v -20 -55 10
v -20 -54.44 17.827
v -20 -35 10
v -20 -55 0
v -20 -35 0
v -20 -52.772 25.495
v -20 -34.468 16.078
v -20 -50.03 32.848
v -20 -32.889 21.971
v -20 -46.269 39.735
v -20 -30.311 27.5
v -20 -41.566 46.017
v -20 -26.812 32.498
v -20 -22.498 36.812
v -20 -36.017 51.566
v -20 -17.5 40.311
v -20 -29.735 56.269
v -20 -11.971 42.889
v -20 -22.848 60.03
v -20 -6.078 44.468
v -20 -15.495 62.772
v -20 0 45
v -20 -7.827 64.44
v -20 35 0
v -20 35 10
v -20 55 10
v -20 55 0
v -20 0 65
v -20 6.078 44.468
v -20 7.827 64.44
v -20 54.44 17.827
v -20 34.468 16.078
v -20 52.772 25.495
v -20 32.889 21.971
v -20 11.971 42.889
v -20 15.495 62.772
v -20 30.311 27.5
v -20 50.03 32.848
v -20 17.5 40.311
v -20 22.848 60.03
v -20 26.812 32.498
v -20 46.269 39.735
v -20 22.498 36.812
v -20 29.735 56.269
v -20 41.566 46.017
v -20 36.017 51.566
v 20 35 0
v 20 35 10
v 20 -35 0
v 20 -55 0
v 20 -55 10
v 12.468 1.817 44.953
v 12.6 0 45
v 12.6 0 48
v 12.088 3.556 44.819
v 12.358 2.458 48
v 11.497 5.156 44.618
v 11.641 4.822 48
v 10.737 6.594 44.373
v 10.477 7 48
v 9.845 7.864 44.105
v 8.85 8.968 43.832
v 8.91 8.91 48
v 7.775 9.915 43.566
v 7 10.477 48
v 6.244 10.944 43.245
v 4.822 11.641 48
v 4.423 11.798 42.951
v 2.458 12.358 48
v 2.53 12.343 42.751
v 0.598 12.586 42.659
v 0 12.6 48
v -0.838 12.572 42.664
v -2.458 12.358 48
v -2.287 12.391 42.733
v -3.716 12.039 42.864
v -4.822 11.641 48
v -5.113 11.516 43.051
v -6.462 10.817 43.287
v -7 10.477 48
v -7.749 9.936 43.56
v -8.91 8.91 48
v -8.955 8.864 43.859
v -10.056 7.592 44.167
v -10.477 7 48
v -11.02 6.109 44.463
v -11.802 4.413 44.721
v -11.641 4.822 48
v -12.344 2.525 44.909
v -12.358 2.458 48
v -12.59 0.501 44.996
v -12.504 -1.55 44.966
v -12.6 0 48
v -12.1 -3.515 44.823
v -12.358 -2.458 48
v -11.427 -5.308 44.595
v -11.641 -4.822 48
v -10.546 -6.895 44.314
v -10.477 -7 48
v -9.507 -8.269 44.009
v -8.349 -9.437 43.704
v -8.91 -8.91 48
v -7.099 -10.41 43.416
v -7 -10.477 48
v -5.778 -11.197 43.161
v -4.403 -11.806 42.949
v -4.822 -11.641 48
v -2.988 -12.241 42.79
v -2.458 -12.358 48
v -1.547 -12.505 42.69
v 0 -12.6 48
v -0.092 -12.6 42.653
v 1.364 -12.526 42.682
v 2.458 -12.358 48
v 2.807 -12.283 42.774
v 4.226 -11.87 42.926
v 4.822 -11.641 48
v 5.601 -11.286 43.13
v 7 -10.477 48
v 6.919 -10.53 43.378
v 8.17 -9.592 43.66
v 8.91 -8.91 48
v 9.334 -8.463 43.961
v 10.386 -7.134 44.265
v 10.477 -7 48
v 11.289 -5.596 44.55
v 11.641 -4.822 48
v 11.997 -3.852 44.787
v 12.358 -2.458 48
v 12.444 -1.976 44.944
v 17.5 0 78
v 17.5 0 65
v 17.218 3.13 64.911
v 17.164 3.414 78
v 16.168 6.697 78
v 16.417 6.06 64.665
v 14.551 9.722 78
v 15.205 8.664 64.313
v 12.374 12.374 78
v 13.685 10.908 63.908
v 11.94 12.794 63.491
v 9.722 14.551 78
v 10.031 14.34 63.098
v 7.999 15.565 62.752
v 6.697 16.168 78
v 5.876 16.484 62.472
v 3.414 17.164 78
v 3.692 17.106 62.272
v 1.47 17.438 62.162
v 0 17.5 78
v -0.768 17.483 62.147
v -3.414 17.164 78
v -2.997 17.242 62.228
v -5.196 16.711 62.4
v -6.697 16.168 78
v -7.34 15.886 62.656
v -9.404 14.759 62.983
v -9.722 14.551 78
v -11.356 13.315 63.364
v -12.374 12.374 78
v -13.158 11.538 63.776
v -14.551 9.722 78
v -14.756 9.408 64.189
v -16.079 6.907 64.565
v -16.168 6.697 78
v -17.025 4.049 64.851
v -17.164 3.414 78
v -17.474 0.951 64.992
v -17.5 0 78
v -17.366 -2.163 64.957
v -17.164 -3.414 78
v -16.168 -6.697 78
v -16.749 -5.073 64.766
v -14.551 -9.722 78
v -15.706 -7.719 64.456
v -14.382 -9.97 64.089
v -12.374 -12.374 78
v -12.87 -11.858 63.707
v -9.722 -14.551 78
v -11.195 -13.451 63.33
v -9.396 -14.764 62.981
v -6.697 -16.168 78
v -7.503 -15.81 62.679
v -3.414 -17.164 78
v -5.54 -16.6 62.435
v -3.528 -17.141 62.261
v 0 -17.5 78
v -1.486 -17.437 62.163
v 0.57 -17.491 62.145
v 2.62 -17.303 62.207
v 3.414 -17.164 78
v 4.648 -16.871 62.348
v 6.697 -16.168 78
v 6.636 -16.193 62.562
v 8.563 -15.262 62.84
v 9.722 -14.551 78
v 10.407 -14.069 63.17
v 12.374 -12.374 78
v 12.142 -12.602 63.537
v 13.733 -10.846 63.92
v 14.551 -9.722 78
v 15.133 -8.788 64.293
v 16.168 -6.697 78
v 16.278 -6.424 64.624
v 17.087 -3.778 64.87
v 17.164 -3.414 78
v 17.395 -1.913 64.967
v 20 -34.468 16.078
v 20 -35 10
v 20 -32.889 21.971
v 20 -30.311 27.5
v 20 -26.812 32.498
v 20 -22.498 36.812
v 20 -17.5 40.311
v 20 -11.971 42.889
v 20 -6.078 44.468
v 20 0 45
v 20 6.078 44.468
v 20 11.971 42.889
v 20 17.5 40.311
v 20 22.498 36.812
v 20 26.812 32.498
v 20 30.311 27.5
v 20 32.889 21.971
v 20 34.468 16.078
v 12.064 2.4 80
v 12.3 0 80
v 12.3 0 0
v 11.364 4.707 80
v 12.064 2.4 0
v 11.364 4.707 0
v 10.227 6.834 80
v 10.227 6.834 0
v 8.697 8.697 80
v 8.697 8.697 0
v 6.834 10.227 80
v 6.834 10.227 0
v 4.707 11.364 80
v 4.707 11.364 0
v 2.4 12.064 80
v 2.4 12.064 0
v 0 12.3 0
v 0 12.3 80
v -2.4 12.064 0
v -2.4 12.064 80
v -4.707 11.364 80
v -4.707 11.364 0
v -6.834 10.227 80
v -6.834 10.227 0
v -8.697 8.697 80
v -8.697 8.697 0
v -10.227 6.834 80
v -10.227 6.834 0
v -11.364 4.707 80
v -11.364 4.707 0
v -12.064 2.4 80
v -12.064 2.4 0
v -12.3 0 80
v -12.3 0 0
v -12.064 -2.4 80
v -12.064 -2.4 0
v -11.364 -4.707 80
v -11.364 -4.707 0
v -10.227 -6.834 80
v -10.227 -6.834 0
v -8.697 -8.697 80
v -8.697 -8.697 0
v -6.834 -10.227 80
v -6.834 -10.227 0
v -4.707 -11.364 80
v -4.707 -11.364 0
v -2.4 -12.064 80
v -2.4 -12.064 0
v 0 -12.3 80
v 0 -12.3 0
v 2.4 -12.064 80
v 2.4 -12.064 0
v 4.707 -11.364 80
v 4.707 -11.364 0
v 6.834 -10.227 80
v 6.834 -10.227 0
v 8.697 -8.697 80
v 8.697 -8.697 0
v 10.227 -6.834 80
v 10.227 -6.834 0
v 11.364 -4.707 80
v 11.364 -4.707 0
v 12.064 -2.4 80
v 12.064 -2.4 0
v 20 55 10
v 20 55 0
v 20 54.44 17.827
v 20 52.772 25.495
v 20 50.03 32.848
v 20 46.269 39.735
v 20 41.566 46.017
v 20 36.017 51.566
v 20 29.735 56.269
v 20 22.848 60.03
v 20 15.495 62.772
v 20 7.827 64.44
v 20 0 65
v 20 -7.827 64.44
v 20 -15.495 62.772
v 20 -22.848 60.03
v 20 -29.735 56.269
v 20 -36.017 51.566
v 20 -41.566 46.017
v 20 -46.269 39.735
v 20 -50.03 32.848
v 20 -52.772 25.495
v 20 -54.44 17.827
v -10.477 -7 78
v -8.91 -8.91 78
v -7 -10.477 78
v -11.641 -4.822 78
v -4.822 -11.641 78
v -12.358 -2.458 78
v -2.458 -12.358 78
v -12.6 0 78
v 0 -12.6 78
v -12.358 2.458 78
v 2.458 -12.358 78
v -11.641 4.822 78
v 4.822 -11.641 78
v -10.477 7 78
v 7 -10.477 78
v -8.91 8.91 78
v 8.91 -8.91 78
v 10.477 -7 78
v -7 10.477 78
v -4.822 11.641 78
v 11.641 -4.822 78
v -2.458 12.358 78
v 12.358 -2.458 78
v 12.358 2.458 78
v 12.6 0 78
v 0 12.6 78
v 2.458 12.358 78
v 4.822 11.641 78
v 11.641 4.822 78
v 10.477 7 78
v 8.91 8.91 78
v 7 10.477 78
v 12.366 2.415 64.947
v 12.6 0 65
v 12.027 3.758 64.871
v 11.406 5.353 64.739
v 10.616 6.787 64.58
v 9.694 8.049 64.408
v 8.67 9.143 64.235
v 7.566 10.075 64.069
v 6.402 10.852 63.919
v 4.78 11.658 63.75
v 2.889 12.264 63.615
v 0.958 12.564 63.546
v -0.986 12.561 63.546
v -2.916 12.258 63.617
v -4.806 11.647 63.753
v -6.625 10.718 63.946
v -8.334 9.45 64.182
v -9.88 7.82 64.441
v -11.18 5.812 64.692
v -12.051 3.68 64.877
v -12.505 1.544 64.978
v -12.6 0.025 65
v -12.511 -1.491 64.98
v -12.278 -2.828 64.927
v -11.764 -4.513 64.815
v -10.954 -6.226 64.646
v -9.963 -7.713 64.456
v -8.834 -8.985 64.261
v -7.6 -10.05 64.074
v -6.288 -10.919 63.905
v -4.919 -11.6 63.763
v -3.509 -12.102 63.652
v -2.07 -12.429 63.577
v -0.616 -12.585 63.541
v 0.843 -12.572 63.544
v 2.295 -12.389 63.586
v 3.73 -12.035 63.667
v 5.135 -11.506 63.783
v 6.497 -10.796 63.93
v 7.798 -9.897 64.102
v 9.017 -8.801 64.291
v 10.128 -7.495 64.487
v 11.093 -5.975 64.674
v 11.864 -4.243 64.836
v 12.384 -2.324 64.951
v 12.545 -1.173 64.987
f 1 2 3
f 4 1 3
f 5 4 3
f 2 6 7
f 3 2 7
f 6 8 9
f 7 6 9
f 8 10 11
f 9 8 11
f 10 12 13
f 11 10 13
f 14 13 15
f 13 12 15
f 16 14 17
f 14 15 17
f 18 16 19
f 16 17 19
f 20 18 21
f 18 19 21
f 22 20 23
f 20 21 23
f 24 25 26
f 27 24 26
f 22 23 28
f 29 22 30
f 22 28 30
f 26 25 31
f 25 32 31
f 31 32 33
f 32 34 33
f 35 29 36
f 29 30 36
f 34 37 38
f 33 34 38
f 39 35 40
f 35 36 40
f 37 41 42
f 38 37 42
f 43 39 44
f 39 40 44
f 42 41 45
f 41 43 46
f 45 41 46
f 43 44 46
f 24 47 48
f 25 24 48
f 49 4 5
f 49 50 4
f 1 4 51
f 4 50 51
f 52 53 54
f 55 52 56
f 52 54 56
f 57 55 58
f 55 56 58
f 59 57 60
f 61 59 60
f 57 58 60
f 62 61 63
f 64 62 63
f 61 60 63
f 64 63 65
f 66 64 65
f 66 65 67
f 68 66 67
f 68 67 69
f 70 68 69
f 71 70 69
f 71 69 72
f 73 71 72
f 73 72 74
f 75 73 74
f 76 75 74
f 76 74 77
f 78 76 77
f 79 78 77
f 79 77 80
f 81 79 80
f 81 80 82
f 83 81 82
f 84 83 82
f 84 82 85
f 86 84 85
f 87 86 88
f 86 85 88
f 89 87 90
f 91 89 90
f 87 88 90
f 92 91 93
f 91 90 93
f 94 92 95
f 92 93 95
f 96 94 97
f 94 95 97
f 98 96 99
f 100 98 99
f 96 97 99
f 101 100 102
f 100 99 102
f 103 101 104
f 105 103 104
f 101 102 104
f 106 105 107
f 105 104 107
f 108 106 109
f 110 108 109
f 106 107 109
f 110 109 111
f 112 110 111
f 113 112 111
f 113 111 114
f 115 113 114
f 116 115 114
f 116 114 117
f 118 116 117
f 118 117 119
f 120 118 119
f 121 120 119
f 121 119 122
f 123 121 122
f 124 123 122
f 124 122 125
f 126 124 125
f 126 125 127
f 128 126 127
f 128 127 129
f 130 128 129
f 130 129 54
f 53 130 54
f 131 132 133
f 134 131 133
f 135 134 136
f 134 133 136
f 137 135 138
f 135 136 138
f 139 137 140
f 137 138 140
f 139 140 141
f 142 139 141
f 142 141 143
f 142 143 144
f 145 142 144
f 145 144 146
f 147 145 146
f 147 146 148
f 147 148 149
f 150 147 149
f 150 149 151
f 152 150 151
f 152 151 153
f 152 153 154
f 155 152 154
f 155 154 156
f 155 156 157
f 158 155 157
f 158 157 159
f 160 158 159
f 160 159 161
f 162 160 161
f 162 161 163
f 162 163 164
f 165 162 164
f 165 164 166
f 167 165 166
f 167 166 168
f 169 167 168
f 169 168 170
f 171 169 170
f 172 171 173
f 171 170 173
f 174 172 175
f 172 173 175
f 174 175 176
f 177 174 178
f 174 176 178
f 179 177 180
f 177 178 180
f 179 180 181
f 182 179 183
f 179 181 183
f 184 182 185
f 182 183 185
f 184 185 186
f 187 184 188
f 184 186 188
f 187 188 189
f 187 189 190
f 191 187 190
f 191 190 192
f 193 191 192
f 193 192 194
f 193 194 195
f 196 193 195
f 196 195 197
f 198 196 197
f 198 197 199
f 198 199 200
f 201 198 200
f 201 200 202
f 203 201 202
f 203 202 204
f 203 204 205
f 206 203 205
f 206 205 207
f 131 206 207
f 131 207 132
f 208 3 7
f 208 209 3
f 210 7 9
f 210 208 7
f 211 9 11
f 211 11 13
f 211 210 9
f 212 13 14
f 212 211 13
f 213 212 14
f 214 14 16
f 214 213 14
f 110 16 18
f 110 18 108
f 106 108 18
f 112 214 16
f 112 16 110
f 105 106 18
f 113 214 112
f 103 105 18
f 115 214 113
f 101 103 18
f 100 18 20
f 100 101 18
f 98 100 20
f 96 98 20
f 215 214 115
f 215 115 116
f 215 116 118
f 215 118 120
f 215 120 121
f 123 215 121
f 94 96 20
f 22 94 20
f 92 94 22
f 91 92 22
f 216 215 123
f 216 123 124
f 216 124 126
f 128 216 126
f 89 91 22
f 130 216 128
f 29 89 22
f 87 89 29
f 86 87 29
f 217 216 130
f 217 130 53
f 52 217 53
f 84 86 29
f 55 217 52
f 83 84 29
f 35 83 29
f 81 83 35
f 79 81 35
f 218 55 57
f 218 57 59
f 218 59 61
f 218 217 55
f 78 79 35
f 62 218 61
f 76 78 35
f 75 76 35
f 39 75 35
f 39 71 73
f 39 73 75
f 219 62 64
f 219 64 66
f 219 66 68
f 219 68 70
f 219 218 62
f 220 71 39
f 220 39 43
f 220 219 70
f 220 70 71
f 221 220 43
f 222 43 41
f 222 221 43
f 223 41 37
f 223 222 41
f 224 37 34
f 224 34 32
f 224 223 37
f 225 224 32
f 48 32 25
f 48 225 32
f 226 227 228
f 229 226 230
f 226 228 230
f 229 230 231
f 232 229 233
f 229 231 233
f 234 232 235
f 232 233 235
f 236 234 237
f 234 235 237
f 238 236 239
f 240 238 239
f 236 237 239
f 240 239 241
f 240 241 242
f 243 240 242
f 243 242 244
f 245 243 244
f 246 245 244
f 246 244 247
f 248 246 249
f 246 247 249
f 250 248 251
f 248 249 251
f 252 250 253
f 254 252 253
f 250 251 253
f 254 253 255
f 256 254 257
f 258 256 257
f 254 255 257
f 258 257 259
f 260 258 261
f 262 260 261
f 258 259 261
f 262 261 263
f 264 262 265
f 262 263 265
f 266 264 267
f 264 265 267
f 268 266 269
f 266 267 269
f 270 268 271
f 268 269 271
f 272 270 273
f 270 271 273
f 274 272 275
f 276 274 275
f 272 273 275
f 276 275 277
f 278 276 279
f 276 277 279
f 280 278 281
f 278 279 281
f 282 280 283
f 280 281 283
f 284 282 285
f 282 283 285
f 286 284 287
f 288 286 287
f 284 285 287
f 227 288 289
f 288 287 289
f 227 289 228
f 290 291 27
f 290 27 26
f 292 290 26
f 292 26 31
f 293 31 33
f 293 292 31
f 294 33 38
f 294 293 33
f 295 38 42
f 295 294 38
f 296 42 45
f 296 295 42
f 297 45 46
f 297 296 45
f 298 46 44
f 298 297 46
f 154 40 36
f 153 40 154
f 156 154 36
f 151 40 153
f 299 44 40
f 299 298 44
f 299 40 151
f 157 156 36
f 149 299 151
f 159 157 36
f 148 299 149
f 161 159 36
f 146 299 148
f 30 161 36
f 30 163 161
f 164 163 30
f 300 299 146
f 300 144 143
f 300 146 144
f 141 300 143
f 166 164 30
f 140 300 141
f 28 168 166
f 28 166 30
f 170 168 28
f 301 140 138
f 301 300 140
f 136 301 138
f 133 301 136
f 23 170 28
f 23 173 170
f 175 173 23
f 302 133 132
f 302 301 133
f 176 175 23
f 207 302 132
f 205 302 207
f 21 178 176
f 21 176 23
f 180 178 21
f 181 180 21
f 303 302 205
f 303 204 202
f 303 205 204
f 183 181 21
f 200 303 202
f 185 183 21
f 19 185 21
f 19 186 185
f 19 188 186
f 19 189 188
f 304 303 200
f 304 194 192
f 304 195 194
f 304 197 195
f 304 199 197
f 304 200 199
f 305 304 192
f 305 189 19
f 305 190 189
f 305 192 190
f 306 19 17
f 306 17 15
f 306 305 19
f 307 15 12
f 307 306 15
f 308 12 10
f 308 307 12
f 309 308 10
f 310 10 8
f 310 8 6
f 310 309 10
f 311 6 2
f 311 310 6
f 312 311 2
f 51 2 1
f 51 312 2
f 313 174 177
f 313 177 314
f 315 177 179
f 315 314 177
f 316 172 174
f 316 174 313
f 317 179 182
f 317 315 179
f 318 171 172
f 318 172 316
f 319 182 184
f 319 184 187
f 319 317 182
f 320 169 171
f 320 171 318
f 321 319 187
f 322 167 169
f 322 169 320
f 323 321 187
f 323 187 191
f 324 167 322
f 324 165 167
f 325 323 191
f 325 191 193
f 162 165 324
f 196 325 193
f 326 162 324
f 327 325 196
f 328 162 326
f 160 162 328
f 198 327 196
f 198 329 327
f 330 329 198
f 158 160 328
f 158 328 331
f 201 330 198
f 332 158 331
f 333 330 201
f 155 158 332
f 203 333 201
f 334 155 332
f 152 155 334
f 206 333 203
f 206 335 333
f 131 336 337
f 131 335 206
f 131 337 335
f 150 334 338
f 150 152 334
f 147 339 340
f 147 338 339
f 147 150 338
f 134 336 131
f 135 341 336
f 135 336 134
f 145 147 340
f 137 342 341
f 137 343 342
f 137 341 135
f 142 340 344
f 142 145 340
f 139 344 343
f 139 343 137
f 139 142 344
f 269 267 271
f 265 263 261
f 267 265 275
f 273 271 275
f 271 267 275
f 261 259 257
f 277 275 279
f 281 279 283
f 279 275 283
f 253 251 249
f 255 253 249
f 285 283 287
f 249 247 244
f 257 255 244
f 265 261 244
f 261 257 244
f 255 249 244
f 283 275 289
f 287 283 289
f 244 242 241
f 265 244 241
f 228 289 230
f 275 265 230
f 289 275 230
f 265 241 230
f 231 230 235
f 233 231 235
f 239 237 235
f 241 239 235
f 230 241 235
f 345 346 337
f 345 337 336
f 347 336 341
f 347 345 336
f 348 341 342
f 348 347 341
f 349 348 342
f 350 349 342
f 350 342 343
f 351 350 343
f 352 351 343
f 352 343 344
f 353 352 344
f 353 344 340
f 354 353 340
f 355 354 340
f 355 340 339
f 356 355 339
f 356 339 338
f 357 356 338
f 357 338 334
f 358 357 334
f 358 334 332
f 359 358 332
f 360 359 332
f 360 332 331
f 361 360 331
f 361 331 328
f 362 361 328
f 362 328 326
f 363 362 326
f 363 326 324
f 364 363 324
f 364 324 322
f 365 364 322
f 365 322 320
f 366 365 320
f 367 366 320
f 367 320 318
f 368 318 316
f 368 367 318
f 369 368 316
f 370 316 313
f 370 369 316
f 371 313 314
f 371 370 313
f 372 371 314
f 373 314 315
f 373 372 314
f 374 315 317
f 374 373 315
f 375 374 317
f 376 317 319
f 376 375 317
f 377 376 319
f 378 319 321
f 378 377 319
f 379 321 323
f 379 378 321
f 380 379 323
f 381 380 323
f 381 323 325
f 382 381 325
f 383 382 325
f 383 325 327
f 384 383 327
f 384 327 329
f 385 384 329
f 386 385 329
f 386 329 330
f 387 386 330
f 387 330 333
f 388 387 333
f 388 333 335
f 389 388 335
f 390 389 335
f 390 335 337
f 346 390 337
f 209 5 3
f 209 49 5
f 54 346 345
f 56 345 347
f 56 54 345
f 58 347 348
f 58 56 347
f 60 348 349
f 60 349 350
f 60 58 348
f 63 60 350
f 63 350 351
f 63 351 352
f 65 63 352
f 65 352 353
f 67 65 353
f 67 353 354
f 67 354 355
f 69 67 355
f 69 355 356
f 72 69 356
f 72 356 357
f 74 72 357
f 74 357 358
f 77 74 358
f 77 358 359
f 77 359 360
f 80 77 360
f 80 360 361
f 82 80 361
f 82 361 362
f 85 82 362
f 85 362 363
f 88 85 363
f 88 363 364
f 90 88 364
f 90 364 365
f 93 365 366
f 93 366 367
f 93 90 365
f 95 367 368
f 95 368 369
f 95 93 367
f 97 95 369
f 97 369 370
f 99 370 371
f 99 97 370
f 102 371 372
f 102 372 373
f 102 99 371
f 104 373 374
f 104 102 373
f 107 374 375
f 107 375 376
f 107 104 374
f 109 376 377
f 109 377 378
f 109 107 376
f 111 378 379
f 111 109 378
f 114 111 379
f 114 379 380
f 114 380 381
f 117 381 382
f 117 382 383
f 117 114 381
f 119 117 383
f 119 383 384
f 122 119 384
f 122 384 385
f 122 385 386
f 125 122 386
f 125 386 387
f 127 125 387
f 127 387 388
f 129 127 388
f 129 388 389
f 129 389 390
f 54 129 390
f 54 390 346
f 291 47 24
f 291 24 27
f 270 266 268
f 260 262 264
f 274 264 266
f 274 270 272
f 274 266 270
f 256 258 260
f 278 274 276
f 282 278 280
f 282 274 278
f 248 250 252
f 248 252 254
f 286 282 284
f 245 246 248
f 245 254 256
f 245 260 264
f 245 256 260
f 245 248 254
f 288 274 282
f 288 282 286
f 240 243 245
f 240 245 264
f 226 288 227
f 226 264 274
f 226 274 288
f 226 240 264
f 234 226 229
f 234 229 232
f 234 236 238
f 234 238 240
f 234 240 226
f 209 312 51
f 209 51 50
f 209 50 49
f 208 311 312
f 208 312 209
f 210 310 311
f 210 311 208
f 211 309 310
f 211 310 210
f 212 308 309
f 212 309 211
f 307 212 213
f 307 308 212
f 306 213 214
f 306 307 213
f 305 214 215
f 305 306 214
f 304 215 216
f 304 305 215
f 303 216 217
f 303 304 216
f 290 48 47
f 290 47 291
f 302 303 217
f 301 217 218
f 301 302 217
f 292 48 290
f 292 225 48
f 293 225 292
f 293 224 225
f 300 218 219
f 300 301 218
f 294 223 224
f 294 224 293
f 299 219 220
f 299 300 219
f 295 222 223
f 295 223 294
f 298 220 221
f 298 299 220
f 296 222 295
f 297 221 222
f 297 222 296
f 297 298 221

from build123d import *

# Parameters (mm, degrees)
F0_W          = 20
F0_H          = 10
F1_DEPTH      = 20
F1_DEPTH_BACK = 20
F3_R          = 17.5
F3_R_2        = 12.6
F4_DEPTH      = 30
F5_DEPTH      = 30
F5_DEPTH_BACK = 40
F6_R          = 12.3
F7_DEPTH      = 80


with BuildPart() as f1:
    # F0 (on Right) → F1 (new body, two sides)
    with BuildSketch(Plane.YZ) as f1_sk:
        with BuildLine():
            ThreePointArc((-35, 10), (0, 45), (35, 10))
            Line((35, 10), (55, 10))
            ThreePointArc((55, 10), (0, 65), (-55, 10))
            Line((-55, 10), (-35, 10))
        make_face()
        with Locations((-45, 5)):
            Rectangle(F0_W, F0_H)
        with Locations((45, 5)):
            Rectangle(F0_W, F0_H)
    extrude(amount=F1_DEPTH)
    extrude(f1_sk.sketch, amount=-F1_DEPTH_BACK)

    # F3 (on offset) → F4 (join)
    with BuildSketch(Plane.XY.offset(48)):
        Circle(F3_R)
        Circle(F3_R_2, mode=Mode.SUBTRACT)
    extrude(amount=F4_DEPTH)

    # F3 (on offset) → F5 (cut, two sides)
    with BuildSketch(Plane.XY.offset(48)) as f5_sk:
        Circle(F3_R_2)
    extrude(amount=-F5_DEPTH, mode=Mode.SUBTRACT)
    extrude(f5_sk.sketch, amount=F5_DEPTH_BACK, mode=Mode.SUBTRACT)


with BuildPart() as f7:
    # F6 (on Top) → F7 (new body)
    with BuildSketch(Plane.XY):
        Circle(F6_R)
    extrude(amount=F7_DEPTH)


solid = Compound([f1.part, f7.part])
